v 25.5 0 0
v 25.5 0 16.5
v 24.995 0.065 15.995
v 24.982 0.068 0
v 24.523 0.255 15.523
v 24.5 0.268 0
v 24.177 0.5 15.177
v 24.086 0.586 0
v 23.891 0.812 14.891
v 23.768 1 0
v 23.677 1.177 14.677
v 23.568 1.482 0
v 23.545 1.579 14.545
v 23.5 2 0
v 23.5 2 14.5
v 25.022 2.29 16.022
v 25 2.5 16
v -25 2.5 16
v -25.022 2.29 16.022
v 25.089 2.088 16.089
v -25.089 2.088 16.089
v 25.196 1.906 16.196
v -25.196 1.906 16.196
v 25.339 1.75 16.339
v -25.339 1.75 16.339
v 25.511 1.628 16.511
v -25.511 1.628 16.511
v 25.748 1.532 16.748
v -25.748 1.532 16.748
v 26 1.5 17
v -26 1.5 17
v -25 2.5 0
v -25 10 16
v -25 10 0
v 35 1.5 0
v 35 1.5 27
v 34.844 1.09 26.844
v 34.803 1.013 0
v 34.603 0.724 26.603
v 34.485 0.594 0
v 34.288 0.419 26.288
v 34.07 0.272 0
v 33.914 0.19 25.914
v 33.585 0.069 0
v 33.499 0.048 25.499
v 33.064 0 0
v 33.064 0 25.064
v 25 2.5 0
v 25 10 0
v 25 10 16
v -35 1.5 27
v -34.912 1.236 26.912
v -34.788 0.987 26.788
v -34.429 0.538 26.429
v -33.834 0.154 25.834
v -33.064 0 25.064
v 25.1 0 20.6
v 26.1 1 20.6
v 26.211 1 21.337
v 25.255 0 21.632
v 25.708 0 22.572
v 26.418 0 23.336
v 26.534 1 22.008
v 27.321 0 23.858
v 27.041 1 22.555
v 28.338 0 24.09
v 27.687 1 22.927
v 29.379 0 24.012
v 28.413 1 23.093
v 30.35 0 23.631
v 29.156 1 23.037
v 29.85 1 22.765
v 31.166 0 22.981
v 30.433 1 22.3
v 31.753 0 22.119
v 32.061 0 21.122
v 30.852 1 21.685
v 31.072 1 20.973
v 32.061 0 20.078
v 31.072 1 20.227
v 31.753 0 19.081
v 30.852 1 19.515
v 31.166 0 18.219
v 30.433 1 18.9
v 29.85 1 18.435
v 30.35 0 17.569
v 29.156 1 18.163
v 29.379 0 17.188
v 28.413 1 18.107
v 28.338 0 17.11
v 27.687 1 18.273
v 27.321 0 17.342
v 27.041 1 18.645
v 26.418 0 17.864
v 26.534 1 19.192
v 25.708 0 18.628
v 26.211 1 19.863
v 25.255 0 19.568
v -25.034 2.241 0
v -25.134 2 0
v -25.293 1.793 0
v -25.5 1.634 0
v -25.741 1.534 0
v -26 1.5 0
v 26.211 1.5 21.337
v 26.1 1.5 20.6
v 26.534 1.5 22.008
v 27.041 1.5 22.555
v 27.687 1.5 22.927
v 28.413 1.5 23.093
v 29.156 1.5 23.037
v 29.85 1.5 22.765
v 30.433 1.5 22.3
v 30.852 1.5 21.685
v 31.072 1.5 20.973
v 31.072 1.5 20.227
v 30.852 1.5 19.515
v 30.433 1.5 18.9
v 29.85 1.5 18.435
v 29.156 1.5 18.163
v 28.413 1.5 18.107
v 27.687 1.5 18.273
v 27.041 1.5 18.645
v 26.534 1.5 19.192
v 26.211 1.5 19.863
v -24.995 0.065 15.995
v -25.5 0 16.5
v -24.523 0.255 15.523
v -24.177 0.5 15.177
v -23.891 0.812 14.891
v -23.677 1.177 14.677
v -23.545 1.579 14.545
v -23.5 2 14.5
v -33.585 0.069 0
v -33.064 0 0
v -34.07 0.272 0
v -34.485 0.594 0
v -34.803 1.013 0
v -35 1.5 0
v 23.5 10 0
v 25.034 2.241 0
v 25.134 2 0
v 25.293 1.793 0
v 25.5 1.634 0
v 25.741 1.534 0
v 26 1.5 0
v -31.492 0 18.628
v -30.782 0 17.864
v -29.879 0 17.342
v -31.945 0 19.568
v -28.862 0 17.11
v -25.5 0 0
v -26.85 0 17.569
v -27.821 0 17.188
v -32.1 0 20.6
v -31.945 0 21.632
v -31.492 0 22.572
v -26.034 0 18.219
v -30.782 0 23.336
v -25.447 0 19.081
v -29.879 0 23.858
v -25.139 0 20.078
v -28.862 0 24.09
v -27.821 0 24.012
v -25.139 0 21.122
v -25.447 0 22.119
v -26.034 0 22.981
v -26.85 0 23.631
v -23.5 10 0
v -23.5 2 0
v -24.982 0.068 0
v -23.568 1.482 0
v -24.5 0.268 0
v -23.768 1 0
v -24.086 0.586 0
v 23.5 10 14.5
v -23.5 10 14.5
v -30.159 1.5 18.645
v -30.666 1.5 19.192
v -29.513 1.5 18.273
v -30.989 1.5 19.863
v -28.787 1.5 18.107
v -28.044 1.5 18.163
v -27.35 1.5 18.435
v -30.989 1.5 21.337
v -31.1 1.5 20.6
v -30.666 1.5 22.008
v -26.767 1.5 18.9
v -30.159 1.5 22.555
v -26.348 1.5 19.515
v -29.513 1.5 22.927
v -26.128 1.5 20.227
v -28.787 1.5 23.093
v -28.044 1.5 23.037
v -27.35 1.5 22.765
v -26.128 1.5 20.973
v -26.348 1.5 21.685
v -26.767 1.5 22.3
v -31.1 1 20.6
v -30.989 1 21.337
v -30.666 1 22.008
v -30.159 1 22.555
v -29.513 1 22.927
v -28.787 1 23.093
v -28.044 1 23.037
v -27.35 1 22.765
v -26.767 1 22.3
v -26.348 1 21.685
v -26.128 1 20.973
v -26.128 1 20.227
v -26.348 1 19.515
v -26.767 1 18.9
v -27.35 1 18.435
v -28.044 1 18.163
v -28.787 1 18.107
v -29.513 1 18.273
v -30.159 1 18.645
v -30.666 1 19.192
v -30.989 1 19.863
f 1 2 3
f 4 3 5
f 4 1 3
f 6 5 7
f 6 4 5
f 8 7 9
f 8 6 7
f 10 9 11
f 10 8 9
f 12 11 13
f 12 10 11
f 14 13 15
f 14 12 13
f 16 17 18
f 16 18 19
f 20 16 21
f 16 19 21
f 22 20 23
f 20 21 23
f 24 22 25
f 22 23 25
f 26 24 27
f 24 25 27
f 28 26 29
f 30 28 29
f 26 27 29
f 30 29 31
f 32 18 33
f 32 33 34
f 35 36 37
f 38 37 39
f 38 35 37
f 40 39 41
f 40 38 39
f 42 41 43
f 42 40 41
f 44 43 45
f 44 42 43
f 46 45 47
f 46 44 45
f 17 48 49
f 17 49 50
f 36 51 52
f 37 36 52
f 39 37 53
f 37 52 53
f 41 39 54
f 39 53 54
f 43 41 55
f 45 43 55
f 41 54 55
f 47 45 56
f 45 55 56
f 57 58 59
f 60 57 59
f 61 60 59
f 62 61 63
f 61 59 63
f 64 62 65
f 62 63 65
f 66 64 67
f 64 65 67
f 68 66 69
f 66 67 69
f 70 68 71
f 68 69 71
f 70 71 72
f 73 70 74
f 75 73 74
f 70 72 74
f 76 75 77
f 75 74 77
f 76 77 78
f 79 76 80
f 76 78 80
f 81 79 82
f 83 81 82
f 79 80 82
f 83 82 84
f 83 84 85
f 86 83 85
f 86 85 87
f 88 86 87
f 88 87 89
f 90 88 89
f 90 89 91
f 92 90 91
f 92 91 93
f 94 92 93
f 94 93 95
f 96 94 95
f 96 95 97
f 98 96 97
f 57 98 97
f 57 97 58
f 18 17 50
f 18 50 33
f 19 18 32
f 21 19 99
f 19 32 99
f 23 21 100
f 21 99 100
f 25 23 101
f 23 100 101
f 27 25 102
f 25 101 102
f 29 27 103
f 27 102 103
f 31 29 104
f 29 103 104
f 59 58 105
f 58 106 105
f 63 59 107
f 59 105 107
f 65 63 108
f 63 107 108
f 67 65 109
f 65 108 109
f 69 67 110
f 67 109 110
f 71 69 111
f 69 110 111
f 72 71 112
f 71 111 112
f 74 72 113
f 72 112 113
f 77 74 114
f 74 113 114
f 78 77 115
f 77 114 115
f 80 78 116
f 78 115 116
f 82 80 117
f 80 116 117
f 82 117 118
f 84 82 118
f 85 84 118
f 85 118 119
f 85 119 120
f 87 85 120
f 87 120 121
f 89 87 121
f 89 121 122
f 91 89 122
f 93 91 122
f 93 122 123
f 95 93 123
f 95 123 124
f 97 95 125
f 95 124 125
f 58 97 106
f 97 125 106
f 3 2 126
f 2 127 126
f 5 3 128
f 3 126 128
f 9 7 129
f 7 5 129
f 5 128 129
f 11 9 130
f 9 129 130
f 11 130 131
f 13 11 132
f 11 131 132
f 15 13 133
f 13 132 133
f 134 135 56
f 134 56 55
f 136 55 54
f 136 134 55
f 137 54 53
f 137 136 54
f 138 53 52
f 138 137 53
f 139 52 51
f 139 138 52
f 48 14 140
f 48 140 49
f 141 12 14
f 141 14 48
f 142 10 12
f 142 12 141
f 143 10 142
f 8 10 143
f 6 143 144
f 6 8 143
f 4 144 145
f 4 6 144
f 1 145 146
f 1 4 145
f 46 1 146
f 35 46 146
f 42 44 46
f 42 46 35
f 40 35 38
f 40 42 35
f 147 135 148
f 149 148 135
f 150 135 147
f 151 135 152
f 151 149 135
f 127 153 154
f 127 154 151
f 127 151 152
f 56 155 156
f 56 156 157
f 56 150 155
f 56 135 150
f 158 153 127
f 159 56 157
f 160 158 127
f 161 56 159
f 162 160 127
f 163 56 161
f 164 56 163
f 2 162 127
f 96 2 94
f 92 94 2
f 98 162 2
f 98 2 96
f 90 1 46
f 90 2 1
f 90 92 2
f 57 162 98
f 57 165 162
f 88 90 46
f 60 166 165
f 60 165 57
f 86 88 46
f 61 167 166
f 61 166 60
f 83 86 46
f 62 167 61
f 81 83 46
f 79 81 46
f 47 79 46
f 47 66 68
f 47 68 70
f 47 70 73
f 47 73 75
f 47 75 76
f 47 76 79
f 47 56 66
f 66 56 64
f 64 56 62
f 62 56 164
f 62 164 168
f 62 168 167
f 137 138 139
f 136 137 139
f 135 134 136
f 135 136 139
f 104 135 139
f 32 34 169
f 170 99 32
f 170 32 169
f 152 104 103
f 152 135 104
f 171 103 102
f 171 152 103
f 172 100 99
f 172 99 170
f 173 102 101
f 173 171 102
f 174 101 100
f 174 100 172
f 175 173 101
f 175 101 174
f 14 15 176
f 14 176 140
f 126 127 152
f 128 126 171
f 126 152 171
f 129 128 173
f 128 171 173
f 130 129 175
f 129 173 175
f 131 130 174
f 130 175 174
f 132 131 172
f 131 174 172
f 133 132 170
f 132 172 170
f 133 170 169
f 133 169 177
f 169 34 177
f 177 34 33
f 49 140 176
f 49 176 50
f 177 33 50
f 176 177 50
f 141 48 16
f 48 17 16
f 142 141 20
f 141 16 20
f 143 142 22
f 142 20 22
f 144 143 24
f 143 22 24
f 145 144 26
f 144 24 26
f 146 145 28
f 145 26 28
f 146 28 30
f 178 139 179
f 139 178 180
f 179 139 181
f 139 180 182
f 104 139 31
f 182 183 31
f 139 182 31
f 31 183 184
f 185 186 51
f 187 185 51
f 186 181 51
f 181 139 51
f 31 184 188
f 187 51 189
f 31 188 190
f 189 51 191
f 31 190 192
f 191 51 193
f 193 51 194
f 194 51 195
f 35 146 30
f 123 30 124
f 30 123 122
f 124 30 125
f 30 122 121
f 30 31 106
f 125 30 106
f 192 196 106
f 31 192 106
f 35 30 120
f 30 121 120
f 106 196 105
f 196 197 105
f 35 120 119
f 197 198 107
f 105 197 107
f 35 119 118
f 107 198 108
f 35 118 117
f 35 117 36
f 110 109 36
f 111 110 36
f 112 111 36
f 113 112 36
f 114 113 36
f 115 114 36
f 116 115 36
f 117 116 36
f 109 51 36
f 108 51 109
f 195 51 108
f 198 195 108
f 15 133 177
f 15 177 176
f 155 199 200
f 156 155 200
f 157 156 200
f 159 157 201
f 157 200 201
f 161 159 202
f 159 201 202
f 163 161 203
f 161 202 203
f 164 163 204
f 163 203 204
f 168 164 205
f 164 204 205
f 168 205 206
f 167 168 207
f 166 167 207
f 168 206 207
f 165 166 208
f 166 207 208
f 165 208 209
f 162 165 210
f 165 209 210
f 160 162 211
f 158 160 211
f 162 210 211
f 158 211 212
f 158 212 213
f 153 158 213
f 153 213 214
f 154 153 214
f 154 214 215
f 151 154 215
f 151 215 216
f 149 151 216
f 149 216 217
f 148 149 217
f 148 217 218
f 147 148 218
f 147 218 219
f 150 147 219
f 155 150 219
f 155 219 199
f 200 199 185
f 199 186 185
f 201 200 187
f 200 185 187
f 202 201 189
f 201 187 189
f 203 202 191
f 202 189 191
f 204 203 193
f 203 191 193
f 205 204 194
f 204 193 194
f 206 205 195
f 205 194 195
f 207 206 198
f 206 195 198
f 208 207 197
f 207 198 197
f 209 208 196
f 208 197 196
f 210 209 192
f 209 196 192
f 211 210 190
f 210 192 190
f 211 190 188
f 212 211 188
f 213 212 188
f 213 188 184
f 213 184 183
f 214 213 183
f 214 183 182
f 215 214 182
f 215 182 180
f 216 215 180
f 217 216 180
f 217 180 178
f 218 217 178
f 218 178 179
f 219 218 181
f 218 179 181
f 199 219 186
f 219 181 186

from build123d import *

# Parameters (mm, degrees)
F1_DEPTH       = 1.5
F2_DEPTH       = 10
F3_D           = 5
F3_CSINK_D     = 7
F3_CSINK_ANGLE = 90
F4_T1_DEPTH    = 36.6824583655
F4_T3_DEPTH    = 79.6824583655
F4_T5_DEPTH    = 19.5
F4_T7_DEPTH    = 47
F4_T13_DEPTH   = 52
F4_T17_DEPTH   = 24.5
F4_T24_DEPTH   = 24.5
F4_T28_DEPTH   = 52
F5_R           = 1


# Not quite as in the source:
# - a fillet or chamfer that OpenCascade refuses, or shapes differently, is made with other operations: its cross-section is extruded or revolved along the edge and cut away or added


with BuildPart() as f1:
    # F0 (on Front) → F1 (new body)
    with BuildSketch(Plane.XZ):
        Polygon((35, 27), (-35, 27), (-35, 0), (-25, 0), (-25, 16), (25, 16), (25, 0), (35, 0), align=None)
        Polygon((-25, 16), (-25, 0), (-23.5, 0), (-23.5, 14.5), (23.5, 14.5), (23.5, 0), (25, 0), (25, 16), align=None)
    extrude(amount=-F1_DEPTH)

    # F0 (on Front) → F2 (join)
    with BuildSketch(Plane.XZ):
        Polygon((-25, 16), (-25, 0), (-23.5, 0), (-23.5, 14.5), (23.5, 14.5), (23.5, 0), (25, 0), (25, 16), align=None)
    extrude(amount=-F2_DEPTH)

    # F3 (through all)
    with Locations(Plane.XZ):
        with Locations((28.6, 20.6), (-28.6, 20.6)):
            CounterSinkHole(F3_D / 2, F3_CSINK_D / 2, counter_sink_angle=F3_CSINK_ANGLE)

    # F4: fillet of radius 2 on 6 edges, made by hand

    # F4_s2 → F4_t1 (cut)
    with BuildSketch(Plane.XY.offset(-4.8412291828)):
        with BuildLine():
            ThreePointArc((-33.0635083269, 0), (-34.2882531983, 0.4188611699), (-35, 1.5))
            Line((-35, 1.5), (-35.0387298335, 1.49))
            ThreePointArc((-35.0387298335, 1.49), (-35.04, 0.75), (-35.04, 0))
            Line((-35.04, 0), (-35, -0.04))
            Line((-35, -0.04), (-33.0635083269, -0.04))
            Line((-33.0635083269, -0.04), (-33.0635083269, 0))
        make_face()
        with BuildLine():
            ThreePointArc((35, 1.5), (34.2882531983, 0.4188611699), (33.0635083269, 0))
            Line((33.0635083269, 0), (33.0635083269, -0.04))
            Line((33.0635083269, -0.04), (35, -0.04))
            Line((35, -0.04), (35.04, 0))
            ThreePointArc((35.04, 0), (35.04, 0.75), (35.0387298335, 1.49))
            Line((35.0387298335, 1.49), (35, 1.5))
        make_face()
    extrude(amount=F4_T1_DEPTH, mode=Mode.SUBTRACT)

    # F4_s4 → F4_t3 (cut)
    with BuildSketch(Plane.YZ.offset(-39.8412291828)):
        with BuildLine():
            ThreePointArc((1.5, 27), (0.4188611699, 26.2882531983), (0, 25.0635083269))
            Line((0, 25.0635083269), (-0.04, 25.0635083269))
            Line((-0.04, 25.0635083269), (-0.04, 27))
            Line((-0.04, 27), (0, 27.04))
            ThreePointArc((0, 27.04), (0.75, 27.04), (1.49, 27.0387298335))
            Line((1.49, 27.0387298335), (1.5, 27))
        make_face()
    extrude(amount=F4_T3_DEPTH, mode=Mode.SUBTRACT)

    # F4_s6 → F4_t5 (cut)
    with BuildSketch(Plane.XY.offset(-5)):
        with BuildLine():
            ThreePointArc((-25.5, 0), (-24.0857864376, 0.5857864376), (-23.5, 2))
            Line((-23.5, 2), (-23.46, 2))
            Line((-23.46, 2), (-23.46, -0.04))
            Line((-23.46, -0.04), (-25.5, -0.04))
            Line((-25.5, -0.04), (-25.5, 0))
        make_face()
        with BuildLine():
            ThreePointArc((25.5, 0), (24.0857864376, 0.5857864376), (23.5, 2))
            Line((23.5, 2), (23.46, 2))
            Line((23.46, 2), (23.46, -0.04))
            Line((23.46, -0.04), (25.5, -0.04))
            Line((25.5, -0.04), (25.5, 0))
        make_face()
    extrude(amount=F4_T5_DEPTH, mode=Mode.SUBTRACT)

    # F4_s8 → F4_t7 (cut)
    with BuildSketch(Plane.YZ.offset(-23.5)):
        with BuildLine():
            ThreePointArc((0, 16.5), (0.5857864376, 15.0857864376), (2, 14.5))
            Line((2, 14.5), (2, 14.46))
            Line((2, 14.46), (-0.04, 14.46))
            Line((-0.04, 14.46), (-0.04, 16.5))
            Line((-0.04, 16.5), (0, 16.5))
        make_face()
    extrude(amount=F4_T7_DEPTH, mode=Mode.SUBTRACT)


with BuildPart() as f4_tool11:
    # F4_s12 → F4_t13 (new body)
    with BuildSketch(Plane.YZ.offset(-28.5)):
        with BuildLine():
            ThreePointArc((0, 16.5), (0.5857864376, 15.0857864376), (2, 14.5))
            Line((2, 14.5), (2, 14.46))
            Line((2, 14.46), (-0.04, 14.46))
            Line((-0.04, 14.46), (-0.04, 16.5))
            Line((-0.04, 16.5), (0, 16.5))
        make_face()
    extrude(amount=F4_T13_DEPTH)

    split(bisect_by=Plane.YZ.offset(-23.5), keep=Keep.BOTTOM)


with BuildPart() as f4_tool15:
    # F4_s16 → F4_t17 (new body)
    with BuildSketch(Plane.XY.offset(-5)):
        with BuildLine():
            ThreePointArc((-25.5, 0), (-24.0857864376, 0.5857864376), (-23.5, 2))
            Line((-23.5, 2), (-23.46, 2))
            Line((-23.46, 2), (-23.46, -0.04))
            Line((-23.46, -0.04), (-25.5, -0.04))
            Line((-25.5, -0.04), (-25.5, 0))
        make_face()
    extrude(amount=F4_T17_DEPTH)

    split(bisect_by=Plane.XY.offset(14.5), keep=Keep.TOP)


with BuildPart() as f4_tool11_1:
    add(f4_tool11.part)

    # F4_t19: intersect F4_tool15
    add(f4_tool15.part, mode=Mode.INTERSECT)


with BuildPart() as f1_1:
    add(f1.part)

    # F4_t9: cut F4_tool11
    add(f4_tool11_1.part, mode=Mode.SUBTRACT)


with BuildPart() as f4_tool22:
    # F4_s23 → F4_t24 (new body)
    with BuildSketch(Plane.XY.offset(19.5)):
        with BuildLine():
            ThreePointArc((25.5, 0), (24.0857864376, 0.5857864376), (23.5, 2))
            Line((23.5, 2), (23.46, 2))
            Line((23.46, 2), (23.46, -0.04))
            Line((23.46, -0.04), (25.5, -0.04))
            Line((25.5, -0.04), (25.5, 0))
        make_face()
    extrude(amount=-F4_T24_DEPTH)

    split(bisect_by=Plane.XY.offset(14.5), keep=Keep.TOP)


with BuildPart() as f4_tool26:
    # F4_s27 → F4_t28 (new body)
    with BuildSketch(Plane.YZ.offset(-23.5)):
        with BuildLine():
            ThreePointArc((0, 16.5), (0.5857864376, 15.0857864376), (2, 14.5))
            Line((2, 14.5), (2, 14.46))
            Line((2, 14.46), (-0.04, 14.46))
            Line((-0.04, 14.46), (-0.04, 16.5))
            Line((-0.04, 16.5), (0, 16.5))
        make_face()
    extrude(amount=F4_T28_DEPTH)

    split(bisect_by=Plane.YZ.offset(23.5), keep=Keep.TOP)


with BuildPart() as f4_tool22_1:
    add(f4_tool22.part)

    # F4_t30: intersect F4_tool26
    add(f4_tool26.part, mode=Mode.INTERSECT)


with BuildPart() as f1_2:
    add(f1_1.part)

    # F4_t20: cut F4_tool22
    add(f4_tool22_1.part, mode=Mode.SUBTRACT)

    # F5
    f5_edges = [f1_2.edges().sort_by_distance(p)[0] for p in [
        (25, 1.5, 8),
        (0, 1.5, 16),
        (-25, 1.5, 8),
    ]]
    fillet(f5_edges, radius=F5_R)


solid = f1_2.part
